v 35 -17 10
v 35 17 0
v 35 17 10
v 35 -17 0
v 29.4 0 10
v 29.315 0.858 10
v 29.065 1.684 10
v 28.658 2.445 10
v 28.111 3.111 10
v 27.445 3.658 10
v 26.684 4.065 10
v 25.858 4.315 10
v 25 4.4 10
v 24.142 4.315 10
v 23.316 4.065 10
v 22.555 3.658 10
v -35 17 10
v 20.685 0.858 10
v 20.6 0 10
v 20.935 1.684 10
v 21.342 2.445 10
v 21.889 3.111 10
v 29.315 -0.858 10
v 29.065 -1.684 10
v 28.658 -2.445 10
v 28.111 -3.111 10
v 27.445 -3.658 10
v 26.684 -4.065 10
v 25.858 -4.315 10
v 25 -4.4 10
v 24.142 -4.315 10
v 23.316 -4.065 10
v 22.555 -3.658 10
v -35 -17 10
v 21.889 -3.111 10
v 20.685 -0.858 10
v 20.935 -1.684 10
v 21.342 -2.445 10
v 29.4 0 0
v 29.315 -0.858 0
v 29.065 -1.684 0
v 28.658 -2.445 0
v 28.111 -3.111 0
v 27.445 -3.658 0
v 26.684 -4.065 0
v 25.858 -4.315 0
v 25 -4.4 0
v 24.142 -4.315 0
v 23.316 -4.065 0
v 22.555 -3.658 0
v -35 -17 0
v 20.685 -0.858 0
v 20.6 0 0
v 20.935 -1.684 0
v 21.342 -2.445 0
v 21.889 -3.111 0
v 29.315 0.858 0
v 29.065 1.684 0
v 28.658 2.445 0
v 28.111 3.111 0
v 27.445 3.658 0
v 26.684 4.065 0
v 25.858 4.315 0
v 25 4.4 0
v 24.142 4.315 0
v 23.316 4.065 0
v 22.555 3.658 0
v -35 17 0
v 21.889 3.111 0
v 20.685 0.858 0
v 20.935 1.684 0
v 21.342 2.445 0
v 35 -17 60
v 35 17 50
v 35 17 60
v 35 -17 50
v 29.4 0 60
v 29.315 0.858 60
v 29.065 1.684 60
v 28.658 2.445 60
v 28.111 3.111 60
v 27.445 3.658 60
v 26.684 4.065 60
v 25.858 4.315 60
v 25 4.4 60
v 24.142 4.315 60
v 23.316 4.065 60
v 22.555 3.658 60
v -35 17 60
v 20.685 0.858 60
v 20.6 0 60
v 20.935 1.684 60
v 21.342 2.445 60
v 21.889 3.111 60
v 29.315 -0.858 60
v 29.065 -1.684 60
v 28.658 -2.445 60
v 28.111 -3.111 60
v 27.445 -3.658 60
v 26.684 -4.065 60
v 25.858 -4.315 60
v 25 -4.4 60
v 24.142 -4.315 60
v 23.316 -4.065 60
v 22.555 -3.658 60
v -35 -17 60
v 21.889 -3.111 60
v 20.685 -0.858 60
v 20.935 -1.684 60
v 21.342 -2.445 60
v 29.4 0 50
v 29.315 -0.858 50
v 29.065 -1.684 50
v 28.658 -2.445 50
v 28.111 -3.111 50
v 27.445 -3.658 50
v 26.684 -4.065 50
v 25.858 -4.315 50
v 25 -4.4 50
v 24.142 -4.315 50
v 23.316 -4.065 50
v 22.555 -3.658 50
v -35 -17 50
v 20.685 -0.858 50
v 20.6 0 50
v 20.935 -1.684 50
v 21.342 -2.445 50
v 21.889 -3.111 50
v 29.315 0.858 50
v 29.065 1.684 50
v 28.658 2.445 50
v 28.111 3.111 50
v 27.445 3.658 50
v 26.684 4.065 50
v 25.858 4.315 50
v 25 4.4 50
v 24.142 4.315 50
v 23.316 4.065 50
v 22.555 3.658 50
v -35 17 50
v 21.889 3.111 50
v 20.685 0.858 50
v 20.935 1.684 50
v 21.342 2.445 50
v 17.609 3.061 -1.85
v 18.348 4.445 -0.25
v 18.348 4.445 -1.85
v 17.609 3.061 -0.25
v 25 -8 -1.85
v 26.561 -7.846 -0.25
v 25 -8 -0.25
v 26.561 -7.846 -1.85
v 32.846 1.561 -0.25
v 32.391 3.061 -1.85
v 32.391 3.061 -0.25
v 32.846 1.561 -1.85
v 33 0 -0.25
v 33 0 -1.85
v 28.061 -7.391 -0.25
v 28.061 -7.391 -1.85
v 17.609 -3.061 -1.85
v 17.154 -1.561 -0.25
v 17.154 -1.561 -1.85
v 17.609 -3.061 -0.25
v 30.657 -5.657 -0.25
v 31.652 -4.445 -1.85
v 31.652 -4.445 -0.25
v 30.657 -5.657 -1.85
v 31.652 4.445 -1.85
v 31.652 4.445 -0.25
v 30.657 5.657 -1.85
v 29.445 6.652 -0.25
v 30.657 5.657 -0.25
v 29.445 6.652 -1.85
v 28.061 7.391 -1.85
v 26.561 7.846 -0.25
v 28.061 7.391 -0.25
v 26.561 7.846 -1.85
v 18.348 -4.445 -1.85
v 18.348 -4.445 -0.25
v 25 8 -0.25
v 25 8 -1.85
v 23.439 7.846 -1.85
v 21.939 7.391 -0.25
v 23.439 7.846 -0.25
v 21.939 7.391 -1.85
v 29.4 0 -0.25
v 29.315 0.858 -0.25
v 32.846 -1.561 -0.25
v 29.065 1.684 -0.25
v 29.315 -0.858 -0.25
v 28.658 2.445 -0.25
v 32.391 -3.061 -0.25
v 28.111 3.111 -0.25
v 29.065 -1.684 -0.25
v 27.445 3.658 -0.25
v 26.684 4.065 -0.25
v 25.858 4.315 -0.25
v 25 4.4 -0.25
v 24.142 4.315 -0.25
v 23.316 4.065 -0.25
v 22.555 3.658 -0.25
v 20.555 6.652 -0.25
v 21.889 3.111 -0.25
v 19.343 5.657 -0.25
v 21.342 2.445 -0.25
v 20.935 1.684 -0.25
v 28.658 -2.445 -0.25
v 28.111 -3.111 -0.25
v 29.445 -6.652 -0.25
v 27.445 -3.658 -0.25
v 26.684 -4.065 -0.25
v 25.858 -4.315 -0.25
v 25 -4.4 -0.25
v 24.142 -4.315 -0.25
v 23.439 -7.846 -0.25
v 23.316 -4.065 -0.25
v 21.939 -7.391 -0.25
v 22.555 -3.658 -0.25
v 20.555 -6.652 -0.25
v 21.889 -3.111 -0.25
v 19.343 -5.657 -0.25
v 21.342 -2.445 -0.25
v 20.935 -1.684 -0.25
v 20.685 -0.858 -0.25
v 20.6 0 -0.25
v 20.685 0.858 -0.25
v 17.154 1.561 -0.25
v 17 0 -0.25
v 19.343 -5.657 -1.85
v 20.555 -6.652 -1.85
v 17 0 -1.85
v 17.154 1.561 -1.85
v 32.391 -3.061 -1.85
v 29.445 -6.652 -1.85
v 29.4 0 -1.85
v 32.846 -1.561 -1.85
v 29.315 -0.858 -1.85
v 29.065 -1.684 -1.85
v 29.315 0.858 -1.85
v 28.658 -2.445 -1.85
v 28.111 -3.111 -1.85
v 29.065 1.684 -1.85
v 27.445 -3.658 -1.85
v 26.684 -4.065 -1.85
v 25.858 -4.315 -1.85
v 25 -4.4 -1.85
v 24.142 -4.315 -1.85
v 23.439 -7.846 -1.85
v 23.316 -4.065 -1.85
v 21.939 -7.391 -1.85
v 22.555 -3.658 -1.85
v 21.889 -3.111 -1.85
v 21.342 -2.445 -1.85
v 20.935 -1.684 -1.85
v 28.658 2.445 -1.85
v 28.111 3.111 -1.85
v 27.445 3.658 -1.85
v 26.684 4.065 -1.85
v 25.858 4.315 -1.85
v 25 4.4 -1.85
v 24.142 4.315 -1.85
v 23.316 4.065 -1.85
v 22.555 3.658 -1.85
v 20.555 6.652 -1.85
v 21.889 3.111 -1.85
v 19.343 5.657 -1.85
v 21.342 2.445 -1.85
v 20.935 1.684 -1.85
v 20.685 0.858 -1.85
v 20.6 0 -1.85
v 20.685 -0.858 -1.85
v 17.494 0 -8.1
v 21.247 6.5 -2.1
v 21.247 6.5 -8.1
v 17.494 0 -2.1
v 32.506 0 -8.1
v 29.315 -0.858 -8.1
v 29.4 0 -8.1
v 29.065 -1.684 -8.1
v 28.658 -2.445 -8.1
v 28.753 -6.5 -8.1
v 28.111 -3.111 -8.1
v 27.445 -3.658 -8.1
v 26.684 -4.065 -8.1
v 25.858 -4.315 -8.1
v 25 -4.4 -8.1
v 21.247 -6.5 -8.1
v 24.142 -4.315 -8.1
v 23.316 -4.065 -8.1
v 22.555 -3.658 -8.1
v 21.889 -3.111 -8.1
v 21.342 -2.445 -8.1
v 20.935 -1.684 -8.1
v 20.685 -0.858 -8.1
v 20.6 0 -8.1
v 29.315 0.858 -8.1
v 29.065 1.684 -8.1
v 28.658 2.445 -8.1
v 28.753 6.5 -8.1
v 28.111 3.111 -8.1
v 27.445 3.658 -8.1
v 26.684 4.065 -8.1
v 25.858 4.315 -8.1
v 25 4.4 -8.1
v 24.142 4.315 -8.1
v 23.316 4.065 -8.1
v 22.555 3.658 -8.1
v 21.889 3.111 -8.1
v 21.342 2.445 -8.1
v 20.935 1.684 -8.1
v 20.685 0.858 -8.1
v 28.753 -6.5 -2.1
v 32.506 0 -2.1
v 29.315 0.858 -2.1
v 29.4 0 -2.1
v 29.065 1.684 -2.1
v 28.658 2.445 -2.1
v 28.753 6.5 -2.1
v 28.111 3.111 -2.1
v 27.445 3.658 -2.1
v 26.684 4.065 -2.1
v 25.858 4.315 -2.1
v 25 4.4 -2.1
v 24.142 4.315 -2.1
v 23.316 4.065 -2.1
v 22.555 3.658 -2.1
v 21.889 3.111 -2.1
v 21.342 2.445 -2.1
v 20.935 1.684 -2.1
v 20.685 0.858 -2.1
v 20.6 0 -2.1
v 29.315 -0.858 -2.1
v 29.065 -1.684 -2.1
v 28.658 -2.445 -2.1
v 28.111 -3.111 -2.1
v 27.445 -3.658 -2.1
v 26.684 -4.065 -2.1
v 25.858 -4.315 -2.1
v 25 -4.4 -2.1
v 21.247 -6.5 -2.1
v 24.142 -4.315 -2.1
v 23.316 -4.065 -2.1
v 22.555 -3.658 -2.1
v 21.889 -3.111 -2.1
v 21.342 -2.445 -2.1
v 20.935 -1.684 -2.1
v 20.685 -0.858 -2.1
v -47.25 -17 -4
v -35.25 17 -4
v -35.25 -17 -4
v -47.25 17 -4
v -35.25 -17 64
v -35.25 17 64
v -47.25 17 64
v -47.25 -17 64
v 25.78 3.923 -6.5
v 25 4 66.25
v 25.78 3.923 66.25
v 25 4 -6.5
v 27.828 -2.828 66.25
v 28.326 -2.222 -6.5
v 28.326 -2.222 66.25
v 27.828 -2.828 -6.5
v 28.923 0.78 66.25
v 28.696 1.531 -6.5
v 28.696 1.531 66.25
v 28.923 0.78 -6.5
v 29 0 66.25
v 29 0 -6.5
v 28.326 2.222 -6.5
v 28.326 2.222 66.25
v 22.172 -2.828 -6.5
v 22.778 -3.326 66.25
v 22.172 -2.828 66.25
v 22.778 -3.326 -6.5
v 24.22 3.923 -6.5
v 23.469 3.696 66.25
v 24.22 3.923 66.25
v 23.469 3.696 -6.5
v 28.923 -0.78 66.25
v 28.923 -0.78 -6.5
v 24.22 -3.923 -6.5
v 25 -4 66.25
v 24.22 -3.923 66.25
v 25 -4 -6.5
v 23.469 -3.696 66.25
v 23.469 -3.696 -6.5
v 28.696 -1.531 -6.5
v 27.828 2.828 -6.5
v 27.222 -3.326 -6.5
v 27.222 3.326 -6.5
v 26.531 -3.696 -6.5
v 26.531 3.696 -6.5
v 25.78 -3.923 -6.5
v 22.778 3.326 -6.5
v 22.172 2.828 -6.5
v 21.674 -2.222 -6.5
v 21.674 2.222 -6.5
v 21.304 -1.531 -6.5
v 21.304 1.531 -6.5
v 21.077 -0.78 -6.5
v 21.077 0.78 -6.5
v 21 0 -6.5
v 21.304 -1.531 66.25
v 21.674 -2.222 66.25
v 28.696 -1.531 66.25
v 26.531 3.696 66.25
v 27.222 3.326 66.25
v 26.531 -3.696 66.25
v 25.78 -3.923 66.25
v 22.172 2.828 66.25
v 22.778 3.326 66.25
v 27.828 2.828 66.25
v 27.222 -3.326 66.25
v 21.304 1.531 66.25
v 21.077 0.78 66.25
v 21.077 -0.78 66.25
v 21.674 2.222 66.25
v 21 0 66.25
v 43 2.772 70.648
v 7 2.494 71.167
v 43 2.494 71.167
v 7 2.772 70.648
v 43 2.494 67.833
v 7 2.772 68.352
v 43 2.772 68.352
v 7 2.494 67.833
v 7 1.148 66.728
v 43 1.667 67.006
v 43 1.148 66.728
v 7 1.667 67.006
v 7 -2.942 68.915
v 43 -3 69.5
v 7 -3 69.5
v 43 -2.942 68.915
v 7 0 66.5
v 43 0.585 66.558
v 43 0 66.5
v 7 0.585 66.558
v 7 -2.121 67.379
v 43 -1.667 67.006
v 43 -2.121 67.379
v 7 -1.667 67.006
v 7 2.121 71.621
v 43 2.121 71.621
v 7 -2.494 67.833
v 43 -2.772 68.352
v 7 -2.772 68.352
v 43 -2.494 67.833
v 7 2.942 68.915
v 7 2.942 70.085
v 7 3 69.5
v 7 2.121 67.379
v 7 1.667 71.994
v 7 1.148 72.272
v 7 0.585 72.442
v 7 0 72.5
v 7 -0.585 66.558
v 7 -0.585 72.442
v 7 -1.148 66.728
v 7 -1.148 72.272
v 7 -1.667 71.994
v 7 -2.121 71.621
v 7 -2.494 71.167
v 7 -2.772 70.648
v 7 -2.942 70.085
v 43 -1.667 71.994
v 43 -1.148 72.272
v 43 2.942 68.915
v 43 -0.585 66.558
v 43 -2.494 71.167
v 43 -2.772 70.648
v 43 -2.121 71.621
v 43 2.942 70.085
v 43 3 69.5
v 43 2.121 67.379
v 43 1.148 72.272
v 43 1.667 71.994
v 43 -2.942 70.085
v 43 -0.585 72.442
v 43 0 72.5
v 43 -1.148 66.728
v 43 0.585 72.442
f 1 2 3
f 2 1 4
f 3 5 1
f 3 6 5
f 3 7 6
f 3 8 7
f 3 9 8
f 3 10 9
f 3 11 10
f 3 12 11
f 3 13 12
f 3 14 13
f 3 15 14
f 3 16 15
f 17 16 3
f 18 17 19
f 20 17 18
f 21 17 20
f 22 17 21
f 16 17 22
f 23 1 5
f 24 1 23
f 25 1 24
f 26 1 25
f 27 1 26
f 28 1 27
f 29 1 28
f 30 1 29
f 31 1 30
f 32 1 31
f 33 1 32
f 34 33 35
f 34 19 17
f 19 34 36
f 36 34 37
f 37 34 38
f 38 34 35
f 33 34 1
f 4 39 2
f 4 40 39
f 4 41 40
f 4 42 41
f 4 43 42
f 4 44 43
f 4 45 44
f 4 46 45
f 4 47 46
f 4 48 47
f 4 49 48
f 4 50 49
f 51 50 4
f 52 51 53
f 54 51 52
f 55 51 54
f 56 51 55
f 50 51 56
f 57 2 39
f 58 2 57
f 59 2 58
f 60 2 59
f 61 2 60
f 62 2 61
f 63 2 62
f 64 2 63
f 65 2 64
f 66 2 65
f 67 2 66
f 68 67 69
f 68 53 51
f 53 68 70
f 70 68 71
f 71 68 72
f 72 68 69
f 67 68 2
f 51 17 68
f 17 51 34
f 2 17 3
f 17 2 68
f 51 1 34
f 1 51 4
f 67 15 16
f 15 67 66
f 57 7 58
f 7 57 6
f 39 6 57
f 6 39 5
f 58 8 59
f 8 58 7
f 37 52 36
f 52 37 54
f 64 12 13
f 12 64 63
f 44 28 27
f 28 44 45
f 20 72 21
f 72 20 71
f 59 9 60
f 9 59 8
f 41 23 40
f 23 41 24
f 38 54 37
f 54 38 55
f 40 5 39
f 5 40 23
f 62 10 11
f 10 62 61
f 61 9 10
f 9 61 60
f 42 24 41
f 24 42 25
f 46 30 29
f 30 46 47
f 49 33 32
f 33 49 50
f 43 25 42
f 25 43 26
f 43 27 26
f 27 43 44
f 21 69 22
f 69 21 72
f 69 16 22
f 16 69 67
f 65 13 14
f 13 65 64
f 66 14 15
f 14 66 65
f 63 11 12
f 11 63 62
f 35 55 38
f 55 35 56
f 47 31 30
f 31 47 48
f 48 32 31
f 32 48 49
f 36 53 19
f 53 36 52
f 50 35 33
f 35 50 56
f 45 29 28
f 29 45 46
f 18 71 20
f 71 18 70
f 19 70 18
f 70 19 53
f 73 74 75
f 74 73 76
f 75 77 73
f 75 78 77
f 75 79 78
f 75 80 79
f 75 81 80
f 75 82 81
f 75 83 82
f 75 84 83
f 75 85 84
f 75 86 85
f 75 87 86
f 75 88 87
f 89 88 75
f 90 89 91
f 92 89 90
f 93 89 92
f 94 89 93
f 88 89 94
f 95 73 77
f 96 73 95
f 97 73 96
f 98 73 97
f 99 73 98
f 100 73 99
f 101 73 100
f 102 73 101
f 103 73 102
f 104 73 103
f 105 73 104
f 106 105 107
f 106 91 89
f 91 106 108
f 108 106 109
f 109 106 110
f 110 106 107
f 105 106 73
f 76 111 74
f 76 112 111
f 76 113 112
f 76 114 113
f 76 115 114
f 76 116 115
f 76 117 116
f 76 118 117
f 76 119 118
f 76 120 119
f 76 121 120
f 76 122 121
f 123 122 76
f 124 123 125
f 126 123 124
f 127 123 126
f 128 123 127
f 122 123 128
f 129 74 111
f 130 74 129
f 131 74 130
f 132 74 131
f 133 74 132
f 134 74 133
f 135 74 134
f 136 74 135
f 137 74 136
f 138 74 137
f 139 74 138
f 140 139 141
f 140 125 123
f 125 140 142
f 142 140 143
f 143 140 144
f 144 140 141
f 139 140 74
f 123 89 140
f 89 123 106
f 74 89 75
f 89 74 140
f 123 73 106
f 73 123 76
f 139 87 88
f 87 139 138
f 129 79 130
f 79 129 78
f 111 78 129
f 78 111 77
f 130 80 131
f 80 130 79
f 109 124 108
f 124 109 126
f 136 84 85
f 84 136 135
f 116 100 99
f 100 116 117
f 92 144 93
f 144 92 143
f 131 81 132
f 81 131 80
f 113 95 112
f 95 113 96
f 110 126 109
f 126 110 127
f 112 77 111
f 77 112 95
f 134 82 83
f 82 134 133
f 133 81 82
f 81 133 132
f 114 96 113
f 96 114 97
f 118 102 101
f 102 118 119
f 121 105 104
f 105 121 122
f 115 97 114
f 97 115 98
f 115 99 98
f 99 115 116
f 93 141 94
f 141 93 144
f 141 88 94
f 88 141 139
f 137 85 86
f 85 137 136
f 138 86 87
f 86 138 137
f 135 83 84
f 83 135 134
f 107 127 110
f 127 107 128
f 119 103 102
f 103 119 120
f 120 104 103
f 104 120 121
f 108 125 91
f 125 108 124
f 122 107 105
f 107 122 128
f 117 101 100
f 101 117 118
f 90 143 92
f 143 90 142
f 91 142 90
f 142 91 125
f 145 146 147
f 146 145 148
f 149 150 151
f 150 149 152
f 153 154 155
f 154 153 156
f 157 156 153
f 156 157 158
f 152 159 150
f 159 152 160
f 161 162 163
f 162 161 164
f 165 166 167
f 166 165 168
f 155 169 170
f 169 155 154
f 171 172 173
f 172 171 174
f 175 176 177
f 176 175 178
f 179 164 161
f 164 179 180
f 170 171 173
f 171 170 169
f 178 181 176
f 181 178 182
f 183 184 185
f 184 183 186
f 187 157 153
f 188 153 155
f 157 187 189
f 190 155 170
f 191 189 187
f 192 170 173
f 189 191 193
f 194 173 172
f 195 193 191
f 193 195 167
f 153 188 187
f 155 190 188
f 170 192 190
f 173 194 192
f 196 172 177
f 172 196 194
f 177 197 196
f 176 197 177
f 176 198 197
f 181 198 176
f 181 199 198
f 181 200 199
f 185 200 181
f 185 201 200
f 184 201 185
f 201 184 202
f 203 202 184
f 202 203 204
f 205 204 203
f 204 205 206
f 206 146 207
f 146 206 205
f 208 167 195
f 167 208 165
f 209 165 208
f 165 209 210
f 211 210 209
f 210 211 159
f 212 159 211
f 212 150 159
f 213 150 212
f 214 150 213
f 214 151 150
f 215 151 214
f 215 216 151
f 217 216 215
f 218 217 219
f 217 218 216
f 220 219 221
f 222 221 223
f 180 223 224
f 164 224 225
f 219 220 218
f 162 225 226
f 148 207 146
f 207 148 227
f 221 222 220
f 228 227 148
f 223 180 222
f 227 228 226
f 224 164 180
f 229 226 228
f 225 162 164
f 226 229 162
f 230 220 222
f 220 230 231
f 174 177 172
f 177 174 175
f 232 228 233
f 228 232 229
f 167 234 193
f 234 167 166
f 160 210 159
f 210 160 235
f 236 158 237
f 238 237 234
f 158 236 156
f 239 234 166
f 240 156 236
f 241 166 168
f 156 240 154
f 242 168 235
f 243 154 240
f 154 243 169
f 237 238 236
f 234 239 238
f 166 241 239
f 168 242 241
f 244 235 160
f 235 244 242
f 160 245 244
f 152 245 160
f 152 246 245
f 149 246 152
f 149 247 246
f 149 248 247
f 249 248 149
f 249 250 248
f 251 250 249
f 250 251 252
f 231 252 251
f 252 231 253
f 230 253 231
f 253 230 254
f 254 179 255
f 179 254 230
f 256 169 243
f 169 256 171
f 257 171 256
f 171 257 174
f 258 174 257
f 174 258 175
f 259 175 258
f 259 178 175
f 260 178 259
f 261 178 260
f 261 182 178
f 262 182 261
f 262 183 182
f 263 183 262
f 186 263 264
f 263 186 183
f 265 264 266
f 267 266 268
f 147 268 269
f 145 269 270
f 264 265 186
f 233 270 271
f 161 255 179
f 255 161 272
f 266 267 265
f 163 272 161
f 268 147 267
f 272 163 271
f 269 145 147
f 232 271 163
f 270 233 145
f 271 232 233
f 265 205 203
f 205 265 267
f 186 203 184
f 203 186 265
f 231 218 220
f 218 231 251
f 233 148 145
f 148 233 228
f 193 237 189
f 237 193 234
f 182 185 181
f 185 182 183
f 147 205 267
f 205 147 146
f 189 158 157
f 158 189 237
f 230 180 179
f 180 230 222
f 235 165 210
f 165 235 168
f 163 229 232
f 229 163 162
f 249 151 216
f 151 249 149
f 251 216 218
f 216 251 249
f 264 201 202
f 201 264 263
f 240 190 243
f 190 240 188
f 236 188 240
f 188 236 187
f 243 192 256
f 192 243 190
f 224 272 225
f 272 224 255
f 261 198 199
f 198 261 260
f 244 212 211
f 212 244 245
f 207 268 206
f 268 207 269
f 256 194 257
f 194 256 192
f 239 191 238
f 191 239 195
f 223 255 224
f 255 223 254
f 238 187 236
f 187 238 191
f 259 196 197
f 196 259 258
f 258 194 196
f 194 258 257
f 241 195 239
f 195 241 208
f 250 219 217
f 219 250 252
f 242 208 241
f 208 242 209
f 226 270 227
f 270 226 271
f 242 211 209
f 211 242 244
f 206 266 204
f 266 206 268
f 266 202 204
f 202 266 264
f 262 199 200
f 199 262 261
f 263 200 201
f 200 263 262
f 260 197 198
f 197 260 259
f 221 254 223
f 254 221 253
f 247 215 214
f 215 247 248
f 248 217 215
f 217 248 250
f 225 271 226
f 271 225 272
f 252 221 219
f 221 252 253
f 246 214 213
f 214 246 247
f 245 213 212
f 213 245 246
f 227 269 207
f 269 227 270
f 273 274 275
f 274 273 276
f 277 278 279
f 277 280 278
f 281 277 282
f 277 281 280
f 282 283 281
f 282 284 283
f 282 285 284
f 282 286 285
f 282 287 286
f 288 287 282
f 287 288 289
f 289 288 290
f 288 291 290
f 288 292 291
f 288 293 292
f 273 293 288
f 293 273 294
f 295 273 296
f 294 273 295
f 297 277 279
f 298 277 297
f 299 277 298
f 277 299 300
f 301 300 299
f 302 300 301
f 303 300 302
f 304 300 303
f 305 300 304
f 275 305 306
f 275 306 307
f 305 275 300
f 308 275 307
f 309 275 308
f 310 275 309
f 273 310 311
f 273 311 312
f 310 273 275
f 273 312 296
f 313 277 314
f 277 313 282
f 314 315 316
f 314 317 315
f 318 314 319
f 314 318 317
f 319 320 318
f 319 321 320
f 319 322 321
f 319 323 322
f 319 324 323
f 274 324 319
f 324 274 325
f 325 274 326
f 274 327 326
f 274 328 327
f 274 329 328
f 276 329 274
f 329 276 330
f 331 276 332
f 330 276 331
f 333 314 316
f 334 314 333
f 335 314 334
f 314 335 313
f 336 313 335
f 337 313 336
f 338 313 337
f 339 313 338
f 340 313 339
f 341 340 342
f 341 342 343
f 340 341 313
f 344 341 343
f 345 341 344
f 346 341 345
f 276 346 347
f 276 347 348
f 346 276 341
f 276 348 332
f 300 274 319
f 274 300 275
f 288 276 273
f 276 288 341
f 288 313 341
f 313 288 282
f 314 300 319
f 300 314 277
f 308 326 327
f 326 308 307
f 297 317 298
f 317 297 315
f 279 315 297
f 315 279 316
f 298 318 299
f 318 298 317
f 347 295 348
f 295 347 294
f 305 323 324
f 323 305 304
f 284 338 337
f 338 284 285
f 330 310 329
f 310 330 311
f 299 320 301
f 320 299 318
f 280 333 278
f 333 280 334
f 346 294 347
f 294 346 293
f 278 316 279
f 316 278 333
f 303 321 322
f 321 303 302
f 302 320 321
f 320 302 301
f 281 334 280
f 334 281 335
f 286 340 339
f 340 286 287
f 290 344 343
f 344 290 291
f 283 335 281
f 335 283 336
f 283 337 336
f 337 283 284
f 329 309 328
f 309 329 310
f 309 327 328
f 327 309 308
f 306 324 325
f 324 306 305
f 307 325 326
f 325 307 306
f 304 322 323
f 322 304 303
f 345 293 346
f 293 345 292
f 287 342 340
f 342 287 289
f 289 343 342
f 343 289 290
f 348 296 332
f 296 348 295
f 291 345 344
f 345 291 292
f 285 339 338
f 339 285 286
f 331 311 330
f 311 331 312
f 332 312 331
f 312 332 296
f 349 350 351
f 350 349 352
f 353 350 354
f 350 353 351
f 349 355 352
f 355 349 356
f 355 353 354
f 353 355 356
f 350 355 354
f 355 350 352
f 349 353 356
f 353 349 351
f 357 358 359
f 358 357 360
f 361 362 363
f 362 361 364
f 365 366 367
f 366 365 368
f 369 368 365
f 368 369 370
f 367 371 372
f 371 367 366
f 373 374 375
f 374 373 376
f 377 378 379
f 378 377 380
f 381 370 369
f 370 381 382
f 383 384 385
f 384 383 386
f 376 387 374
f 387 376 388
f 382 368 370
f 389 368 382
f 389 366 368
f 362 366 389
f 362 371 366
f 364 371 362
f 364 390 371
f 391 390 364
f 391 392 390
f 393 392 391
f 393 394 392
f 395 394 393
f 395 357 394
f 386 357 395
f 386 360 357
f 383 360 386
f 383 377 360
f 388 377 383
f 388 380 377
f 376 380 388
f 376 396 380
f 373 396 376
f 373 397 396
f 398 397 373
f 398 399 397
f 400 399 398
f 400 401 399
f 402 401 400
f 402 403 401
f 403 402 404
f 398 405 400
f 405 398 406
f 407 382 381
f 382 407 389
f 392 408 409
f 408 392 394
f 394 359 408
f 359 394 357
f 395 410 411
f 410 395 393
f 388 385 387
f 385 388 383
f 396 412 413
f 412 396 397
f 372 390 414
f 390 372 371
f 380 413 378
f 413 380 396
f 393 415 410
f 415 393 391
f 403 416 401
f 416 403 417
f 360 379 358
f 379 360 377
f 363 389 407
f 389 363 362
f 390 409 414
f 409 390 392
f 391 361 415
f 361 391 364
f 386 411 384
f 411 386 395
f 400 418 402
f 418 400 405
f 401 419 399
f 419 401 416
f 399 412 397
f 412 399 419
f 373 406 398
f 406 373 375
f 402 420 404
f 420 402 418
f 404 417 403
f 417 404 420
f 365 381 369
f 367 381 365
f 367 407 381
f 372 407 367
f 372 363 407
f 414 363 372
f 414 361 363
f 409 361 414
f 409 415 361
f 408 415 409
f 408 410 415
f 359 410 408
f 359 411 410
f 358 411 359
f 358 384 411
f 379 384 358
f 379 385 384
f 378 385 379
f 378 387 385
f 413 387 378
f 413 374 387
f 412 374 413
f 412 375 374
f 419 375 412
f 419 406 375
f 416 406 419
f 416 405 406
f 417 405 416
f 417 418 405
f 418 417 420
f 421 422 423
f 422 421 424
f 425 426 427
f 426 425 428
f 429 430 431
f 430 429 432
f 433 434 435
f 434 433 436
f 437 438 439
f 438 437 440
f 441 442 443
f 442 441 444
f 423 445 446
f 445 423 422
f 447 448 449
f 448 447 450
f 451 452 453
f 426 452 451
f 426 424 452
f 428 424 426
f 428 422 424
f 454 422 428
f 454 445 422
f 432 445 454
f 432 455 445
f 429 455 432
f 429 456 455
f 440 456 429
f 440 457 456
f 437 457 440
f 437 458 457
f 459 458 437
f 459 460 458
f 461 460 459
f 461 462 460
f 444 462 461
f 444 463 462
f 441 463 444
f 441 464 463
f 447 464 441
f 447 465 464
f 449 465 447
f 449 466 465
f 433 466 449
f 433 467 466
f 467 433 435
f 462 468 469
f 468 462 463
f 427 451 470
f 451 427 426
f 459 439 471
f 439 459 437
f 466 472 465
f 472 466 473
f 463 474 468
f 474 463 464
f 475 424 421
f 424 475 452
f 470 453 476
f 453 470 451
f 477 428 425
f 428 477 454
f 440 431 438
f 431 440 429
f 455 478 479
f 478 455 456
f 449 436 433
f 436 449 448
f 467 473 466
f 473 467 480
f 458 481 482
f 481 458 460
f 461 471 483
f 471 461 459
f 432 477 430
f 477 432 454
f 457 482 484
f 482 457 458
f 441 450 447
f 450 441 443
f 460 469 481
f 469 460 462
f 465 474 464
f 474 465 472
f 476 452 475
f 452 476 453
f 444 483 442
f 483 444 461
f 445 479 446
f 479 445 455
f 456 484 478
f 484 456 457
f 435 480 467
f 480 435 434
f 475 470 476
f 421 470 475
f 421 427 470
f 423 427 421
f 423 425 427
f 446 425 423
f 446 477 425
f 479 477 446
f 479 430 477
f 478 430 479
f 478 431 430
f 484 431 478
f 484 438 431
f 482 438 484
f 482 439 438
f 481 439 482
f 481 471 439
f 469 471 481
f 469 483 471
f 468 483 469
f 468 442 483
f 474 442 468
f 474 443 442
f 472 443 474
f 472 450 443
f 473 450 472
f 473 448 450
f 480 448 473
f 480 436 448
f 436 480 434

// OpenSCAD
$fn = 32;

// ------------------------------------------------------------------------
// C clamp: throat 50 mm, screw d8
// Every part is its own module, assembly() places every instance.
// ------------------------------------------------------------------------

// --- part 1 ---
module clamp_arm() {
  difference() {
    translate([-35, -17, 0]) cube([70, 34, 10]);
    translate([25, 0, -1]) cylinder(h = 12, d = 8.8);
  }
}

// --- part 2 ---
module clamp_spine() {
  difference() {
    translate([-34, -17, 0]) cube([68, 34, 12]);
  }
}

// --- part 3 ---
module clamp_screw() {
  translate([0, 0, -36.375]) cylinder(h = 72.75, d = 8);
}

// --- part 4 ---
module clamp_washer() {
  difference() {
      translate([0, 0, 0]) cylinder(h = 1.6, d = 16);
      translate([0, 0, -1]) cylinder(h = 3.6, d = 8.8);
    }
}

// --- part 5 ---
module clamp_nut() {
  difference() {
    linear_extrude(height = 6) polygon(points = [[7.506, 0], [3.753, 6.5], [-3.753, 6.5], [-7.506, 0], [-3.753, -6.5], [3.753, -6.5]]);
    translate([0, 0, -1]) cylinder(h = 8, d = 8.8);
  }
}

// --- part 6 ---
module tommy_bar() {
  translate([0, 0, -18]) cylinder(h = 36, d = 6);
}

// --- assembly ---
module assembly() {
  color([0.80, 0.24, 0.20]) translate([0, 0, 0]) rotate([0, 0, 0]) clamp_arm();
  color([0.20, 0.45, 0.75]) translate([0, 0, 50]) rotate([0, 0, 0]) clamp_arm();
  color([0.25, 0.62, 0.32]) translate([-47.25, 0, 30]) rotate([0, 90, 0]) clamp_spine();
  color([0.92, 0.70, 0.18]) translate([25, 0, 29.875]) rotate([0, 0, 0]) clamp_screw();
  color([0.58, 0.35, 0.70]) translate([25, 0, -1.85]) rotate([0, 0, 0]) clamp_washer();
  color([0.16, 0.66, 0.66]) translate([25, 0, -8.1]) rotate([0, 0, 0]) clamp_nut();
  color([0.85, 0.48, 0.18]) translate([25, 0, 69.5]) rotate([0, 90, 0]) tommy_bar();
}

assembly();
